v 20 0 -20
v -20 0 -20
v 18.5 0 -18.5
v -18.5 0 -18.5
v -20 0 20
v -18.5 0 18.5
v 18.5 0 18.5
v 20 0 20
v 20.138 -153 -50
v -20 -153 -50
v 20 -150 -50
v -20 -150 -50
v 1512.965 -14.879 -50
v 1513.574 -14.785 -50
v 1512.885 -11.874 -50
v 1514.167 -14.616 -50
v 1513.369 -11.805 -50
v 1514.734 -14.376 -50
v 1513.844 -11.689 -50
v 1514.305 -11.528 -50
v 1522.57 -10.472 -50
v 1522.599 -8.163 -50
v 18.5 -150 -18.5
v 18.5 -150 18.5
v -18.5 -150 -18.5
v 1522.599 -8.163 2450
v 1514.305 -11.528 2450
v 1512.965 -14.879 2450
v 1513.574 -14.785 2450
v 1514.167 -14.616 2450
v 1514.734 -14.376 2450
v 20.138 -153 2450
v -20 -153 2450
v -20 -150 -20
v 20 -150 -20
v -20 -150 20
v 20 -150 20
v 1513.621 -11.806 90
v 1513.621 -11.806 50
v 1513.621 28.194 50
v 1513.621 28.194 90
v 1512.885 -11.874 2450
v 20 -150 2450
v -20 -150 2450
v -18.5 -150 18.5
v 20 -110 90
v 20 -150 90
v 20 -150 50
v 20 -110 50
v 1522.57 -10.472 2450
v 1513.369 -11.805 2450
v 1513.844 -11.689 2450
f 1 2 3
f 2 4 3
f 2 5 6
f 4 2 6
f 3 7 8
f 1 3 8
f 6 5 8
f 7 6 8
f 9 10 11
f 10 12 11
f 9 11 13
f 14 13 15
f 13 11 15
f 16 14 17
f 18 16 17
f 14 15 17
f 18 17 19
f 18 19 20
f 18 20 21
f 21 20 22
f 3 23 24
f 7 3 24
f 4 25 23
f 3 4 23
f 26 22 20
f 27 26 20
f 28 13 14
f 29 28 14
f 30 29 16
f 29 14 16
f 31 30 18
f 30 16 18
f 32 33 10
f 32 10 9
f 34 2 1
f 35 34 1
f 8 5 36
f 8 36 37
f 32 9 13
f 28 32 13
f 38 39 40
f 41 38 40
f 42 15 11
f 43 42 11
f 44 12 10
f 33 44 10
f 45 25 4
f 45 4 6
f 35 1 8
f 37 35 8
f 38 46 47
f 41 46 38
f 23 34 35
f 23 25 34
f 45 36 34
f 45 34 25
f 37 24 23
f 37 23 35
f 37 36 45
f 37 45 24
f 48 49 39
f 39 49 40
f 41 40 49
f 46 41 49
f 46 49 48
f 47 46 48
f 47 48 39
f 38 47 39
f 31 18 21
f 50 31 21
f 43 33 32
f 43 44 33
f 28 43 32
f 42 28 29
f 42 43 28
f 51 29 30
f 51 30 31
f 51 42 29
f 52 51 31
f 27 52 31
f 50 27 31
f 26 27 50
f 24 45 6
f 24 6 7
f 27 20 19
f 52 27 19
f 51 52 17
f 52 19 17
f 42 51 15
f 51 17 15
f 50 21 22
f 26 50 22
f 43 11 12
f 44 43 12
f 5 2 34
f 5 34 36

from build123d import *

# Parameters (mm, degrees)
F0_W     = 40
F0_H     = 40
F0_W_2   = 37
F0_H_2   = 37
F1_DEPTH = 150
F4_DEPTH = 40
F7_DEPTH = 2500


with BuildPart() as f1:
    # F0 (on Front) → F1 (new body)
    with BuildSketch(Plane.XZ):
        Rectangle(F0_W, F0_H)
        Rectangle(F0_W_2, F0_H_2, mode=Mode.SUBTRACT)
    extrude(amount=F1_DEPTH)


with BuildPart() as f4:
    # F3 (on offset) → F4 (new body)
    with BuildSketch(Plane.XY.offset(50)):
        Polygon((20, -110), (20, -150), (1513.620532, -11.805552), (1513.620532, 28.194448), align=None)
    extrude(amount=F4_DEPTH)


with BuildPart() as f7:
    # F6 (on offset) → F7 (new body)
    with BuildSketch(Plane.XY.offset(-50)):
        with BuildLine():
            Line((-20, -153), (20.138489, -153))
            Line((20.138489, -153), (1512.965352, -14.878984))
            ThreePointArc((1512.965352, -14.878984), (1513.873172, -14.709334), (1514.734304, -14.375613))
            Line((1514.734304, -14.375613), (1522.569582, -10.472124))
            Line((1522.569582, -10.472124), (1522.598982, -8.16266))
            Line((1522.598982, -8.16266), (1514.304619, -11.527992))
            ThreePointArc((1514.304619, -11.527992), (1513.607707, -11.752883), (1512.885421, -11.873566))
            Line((1512.885421, -11.873566), (20, -150))
            Line((20, -150), (-20, -150))
            Line((-20, -150), (-20, -153))
        make_face()
    extrude(amount=F7_DEPTH)


solid = Compound([f1.part, f4.part, f7.part])
